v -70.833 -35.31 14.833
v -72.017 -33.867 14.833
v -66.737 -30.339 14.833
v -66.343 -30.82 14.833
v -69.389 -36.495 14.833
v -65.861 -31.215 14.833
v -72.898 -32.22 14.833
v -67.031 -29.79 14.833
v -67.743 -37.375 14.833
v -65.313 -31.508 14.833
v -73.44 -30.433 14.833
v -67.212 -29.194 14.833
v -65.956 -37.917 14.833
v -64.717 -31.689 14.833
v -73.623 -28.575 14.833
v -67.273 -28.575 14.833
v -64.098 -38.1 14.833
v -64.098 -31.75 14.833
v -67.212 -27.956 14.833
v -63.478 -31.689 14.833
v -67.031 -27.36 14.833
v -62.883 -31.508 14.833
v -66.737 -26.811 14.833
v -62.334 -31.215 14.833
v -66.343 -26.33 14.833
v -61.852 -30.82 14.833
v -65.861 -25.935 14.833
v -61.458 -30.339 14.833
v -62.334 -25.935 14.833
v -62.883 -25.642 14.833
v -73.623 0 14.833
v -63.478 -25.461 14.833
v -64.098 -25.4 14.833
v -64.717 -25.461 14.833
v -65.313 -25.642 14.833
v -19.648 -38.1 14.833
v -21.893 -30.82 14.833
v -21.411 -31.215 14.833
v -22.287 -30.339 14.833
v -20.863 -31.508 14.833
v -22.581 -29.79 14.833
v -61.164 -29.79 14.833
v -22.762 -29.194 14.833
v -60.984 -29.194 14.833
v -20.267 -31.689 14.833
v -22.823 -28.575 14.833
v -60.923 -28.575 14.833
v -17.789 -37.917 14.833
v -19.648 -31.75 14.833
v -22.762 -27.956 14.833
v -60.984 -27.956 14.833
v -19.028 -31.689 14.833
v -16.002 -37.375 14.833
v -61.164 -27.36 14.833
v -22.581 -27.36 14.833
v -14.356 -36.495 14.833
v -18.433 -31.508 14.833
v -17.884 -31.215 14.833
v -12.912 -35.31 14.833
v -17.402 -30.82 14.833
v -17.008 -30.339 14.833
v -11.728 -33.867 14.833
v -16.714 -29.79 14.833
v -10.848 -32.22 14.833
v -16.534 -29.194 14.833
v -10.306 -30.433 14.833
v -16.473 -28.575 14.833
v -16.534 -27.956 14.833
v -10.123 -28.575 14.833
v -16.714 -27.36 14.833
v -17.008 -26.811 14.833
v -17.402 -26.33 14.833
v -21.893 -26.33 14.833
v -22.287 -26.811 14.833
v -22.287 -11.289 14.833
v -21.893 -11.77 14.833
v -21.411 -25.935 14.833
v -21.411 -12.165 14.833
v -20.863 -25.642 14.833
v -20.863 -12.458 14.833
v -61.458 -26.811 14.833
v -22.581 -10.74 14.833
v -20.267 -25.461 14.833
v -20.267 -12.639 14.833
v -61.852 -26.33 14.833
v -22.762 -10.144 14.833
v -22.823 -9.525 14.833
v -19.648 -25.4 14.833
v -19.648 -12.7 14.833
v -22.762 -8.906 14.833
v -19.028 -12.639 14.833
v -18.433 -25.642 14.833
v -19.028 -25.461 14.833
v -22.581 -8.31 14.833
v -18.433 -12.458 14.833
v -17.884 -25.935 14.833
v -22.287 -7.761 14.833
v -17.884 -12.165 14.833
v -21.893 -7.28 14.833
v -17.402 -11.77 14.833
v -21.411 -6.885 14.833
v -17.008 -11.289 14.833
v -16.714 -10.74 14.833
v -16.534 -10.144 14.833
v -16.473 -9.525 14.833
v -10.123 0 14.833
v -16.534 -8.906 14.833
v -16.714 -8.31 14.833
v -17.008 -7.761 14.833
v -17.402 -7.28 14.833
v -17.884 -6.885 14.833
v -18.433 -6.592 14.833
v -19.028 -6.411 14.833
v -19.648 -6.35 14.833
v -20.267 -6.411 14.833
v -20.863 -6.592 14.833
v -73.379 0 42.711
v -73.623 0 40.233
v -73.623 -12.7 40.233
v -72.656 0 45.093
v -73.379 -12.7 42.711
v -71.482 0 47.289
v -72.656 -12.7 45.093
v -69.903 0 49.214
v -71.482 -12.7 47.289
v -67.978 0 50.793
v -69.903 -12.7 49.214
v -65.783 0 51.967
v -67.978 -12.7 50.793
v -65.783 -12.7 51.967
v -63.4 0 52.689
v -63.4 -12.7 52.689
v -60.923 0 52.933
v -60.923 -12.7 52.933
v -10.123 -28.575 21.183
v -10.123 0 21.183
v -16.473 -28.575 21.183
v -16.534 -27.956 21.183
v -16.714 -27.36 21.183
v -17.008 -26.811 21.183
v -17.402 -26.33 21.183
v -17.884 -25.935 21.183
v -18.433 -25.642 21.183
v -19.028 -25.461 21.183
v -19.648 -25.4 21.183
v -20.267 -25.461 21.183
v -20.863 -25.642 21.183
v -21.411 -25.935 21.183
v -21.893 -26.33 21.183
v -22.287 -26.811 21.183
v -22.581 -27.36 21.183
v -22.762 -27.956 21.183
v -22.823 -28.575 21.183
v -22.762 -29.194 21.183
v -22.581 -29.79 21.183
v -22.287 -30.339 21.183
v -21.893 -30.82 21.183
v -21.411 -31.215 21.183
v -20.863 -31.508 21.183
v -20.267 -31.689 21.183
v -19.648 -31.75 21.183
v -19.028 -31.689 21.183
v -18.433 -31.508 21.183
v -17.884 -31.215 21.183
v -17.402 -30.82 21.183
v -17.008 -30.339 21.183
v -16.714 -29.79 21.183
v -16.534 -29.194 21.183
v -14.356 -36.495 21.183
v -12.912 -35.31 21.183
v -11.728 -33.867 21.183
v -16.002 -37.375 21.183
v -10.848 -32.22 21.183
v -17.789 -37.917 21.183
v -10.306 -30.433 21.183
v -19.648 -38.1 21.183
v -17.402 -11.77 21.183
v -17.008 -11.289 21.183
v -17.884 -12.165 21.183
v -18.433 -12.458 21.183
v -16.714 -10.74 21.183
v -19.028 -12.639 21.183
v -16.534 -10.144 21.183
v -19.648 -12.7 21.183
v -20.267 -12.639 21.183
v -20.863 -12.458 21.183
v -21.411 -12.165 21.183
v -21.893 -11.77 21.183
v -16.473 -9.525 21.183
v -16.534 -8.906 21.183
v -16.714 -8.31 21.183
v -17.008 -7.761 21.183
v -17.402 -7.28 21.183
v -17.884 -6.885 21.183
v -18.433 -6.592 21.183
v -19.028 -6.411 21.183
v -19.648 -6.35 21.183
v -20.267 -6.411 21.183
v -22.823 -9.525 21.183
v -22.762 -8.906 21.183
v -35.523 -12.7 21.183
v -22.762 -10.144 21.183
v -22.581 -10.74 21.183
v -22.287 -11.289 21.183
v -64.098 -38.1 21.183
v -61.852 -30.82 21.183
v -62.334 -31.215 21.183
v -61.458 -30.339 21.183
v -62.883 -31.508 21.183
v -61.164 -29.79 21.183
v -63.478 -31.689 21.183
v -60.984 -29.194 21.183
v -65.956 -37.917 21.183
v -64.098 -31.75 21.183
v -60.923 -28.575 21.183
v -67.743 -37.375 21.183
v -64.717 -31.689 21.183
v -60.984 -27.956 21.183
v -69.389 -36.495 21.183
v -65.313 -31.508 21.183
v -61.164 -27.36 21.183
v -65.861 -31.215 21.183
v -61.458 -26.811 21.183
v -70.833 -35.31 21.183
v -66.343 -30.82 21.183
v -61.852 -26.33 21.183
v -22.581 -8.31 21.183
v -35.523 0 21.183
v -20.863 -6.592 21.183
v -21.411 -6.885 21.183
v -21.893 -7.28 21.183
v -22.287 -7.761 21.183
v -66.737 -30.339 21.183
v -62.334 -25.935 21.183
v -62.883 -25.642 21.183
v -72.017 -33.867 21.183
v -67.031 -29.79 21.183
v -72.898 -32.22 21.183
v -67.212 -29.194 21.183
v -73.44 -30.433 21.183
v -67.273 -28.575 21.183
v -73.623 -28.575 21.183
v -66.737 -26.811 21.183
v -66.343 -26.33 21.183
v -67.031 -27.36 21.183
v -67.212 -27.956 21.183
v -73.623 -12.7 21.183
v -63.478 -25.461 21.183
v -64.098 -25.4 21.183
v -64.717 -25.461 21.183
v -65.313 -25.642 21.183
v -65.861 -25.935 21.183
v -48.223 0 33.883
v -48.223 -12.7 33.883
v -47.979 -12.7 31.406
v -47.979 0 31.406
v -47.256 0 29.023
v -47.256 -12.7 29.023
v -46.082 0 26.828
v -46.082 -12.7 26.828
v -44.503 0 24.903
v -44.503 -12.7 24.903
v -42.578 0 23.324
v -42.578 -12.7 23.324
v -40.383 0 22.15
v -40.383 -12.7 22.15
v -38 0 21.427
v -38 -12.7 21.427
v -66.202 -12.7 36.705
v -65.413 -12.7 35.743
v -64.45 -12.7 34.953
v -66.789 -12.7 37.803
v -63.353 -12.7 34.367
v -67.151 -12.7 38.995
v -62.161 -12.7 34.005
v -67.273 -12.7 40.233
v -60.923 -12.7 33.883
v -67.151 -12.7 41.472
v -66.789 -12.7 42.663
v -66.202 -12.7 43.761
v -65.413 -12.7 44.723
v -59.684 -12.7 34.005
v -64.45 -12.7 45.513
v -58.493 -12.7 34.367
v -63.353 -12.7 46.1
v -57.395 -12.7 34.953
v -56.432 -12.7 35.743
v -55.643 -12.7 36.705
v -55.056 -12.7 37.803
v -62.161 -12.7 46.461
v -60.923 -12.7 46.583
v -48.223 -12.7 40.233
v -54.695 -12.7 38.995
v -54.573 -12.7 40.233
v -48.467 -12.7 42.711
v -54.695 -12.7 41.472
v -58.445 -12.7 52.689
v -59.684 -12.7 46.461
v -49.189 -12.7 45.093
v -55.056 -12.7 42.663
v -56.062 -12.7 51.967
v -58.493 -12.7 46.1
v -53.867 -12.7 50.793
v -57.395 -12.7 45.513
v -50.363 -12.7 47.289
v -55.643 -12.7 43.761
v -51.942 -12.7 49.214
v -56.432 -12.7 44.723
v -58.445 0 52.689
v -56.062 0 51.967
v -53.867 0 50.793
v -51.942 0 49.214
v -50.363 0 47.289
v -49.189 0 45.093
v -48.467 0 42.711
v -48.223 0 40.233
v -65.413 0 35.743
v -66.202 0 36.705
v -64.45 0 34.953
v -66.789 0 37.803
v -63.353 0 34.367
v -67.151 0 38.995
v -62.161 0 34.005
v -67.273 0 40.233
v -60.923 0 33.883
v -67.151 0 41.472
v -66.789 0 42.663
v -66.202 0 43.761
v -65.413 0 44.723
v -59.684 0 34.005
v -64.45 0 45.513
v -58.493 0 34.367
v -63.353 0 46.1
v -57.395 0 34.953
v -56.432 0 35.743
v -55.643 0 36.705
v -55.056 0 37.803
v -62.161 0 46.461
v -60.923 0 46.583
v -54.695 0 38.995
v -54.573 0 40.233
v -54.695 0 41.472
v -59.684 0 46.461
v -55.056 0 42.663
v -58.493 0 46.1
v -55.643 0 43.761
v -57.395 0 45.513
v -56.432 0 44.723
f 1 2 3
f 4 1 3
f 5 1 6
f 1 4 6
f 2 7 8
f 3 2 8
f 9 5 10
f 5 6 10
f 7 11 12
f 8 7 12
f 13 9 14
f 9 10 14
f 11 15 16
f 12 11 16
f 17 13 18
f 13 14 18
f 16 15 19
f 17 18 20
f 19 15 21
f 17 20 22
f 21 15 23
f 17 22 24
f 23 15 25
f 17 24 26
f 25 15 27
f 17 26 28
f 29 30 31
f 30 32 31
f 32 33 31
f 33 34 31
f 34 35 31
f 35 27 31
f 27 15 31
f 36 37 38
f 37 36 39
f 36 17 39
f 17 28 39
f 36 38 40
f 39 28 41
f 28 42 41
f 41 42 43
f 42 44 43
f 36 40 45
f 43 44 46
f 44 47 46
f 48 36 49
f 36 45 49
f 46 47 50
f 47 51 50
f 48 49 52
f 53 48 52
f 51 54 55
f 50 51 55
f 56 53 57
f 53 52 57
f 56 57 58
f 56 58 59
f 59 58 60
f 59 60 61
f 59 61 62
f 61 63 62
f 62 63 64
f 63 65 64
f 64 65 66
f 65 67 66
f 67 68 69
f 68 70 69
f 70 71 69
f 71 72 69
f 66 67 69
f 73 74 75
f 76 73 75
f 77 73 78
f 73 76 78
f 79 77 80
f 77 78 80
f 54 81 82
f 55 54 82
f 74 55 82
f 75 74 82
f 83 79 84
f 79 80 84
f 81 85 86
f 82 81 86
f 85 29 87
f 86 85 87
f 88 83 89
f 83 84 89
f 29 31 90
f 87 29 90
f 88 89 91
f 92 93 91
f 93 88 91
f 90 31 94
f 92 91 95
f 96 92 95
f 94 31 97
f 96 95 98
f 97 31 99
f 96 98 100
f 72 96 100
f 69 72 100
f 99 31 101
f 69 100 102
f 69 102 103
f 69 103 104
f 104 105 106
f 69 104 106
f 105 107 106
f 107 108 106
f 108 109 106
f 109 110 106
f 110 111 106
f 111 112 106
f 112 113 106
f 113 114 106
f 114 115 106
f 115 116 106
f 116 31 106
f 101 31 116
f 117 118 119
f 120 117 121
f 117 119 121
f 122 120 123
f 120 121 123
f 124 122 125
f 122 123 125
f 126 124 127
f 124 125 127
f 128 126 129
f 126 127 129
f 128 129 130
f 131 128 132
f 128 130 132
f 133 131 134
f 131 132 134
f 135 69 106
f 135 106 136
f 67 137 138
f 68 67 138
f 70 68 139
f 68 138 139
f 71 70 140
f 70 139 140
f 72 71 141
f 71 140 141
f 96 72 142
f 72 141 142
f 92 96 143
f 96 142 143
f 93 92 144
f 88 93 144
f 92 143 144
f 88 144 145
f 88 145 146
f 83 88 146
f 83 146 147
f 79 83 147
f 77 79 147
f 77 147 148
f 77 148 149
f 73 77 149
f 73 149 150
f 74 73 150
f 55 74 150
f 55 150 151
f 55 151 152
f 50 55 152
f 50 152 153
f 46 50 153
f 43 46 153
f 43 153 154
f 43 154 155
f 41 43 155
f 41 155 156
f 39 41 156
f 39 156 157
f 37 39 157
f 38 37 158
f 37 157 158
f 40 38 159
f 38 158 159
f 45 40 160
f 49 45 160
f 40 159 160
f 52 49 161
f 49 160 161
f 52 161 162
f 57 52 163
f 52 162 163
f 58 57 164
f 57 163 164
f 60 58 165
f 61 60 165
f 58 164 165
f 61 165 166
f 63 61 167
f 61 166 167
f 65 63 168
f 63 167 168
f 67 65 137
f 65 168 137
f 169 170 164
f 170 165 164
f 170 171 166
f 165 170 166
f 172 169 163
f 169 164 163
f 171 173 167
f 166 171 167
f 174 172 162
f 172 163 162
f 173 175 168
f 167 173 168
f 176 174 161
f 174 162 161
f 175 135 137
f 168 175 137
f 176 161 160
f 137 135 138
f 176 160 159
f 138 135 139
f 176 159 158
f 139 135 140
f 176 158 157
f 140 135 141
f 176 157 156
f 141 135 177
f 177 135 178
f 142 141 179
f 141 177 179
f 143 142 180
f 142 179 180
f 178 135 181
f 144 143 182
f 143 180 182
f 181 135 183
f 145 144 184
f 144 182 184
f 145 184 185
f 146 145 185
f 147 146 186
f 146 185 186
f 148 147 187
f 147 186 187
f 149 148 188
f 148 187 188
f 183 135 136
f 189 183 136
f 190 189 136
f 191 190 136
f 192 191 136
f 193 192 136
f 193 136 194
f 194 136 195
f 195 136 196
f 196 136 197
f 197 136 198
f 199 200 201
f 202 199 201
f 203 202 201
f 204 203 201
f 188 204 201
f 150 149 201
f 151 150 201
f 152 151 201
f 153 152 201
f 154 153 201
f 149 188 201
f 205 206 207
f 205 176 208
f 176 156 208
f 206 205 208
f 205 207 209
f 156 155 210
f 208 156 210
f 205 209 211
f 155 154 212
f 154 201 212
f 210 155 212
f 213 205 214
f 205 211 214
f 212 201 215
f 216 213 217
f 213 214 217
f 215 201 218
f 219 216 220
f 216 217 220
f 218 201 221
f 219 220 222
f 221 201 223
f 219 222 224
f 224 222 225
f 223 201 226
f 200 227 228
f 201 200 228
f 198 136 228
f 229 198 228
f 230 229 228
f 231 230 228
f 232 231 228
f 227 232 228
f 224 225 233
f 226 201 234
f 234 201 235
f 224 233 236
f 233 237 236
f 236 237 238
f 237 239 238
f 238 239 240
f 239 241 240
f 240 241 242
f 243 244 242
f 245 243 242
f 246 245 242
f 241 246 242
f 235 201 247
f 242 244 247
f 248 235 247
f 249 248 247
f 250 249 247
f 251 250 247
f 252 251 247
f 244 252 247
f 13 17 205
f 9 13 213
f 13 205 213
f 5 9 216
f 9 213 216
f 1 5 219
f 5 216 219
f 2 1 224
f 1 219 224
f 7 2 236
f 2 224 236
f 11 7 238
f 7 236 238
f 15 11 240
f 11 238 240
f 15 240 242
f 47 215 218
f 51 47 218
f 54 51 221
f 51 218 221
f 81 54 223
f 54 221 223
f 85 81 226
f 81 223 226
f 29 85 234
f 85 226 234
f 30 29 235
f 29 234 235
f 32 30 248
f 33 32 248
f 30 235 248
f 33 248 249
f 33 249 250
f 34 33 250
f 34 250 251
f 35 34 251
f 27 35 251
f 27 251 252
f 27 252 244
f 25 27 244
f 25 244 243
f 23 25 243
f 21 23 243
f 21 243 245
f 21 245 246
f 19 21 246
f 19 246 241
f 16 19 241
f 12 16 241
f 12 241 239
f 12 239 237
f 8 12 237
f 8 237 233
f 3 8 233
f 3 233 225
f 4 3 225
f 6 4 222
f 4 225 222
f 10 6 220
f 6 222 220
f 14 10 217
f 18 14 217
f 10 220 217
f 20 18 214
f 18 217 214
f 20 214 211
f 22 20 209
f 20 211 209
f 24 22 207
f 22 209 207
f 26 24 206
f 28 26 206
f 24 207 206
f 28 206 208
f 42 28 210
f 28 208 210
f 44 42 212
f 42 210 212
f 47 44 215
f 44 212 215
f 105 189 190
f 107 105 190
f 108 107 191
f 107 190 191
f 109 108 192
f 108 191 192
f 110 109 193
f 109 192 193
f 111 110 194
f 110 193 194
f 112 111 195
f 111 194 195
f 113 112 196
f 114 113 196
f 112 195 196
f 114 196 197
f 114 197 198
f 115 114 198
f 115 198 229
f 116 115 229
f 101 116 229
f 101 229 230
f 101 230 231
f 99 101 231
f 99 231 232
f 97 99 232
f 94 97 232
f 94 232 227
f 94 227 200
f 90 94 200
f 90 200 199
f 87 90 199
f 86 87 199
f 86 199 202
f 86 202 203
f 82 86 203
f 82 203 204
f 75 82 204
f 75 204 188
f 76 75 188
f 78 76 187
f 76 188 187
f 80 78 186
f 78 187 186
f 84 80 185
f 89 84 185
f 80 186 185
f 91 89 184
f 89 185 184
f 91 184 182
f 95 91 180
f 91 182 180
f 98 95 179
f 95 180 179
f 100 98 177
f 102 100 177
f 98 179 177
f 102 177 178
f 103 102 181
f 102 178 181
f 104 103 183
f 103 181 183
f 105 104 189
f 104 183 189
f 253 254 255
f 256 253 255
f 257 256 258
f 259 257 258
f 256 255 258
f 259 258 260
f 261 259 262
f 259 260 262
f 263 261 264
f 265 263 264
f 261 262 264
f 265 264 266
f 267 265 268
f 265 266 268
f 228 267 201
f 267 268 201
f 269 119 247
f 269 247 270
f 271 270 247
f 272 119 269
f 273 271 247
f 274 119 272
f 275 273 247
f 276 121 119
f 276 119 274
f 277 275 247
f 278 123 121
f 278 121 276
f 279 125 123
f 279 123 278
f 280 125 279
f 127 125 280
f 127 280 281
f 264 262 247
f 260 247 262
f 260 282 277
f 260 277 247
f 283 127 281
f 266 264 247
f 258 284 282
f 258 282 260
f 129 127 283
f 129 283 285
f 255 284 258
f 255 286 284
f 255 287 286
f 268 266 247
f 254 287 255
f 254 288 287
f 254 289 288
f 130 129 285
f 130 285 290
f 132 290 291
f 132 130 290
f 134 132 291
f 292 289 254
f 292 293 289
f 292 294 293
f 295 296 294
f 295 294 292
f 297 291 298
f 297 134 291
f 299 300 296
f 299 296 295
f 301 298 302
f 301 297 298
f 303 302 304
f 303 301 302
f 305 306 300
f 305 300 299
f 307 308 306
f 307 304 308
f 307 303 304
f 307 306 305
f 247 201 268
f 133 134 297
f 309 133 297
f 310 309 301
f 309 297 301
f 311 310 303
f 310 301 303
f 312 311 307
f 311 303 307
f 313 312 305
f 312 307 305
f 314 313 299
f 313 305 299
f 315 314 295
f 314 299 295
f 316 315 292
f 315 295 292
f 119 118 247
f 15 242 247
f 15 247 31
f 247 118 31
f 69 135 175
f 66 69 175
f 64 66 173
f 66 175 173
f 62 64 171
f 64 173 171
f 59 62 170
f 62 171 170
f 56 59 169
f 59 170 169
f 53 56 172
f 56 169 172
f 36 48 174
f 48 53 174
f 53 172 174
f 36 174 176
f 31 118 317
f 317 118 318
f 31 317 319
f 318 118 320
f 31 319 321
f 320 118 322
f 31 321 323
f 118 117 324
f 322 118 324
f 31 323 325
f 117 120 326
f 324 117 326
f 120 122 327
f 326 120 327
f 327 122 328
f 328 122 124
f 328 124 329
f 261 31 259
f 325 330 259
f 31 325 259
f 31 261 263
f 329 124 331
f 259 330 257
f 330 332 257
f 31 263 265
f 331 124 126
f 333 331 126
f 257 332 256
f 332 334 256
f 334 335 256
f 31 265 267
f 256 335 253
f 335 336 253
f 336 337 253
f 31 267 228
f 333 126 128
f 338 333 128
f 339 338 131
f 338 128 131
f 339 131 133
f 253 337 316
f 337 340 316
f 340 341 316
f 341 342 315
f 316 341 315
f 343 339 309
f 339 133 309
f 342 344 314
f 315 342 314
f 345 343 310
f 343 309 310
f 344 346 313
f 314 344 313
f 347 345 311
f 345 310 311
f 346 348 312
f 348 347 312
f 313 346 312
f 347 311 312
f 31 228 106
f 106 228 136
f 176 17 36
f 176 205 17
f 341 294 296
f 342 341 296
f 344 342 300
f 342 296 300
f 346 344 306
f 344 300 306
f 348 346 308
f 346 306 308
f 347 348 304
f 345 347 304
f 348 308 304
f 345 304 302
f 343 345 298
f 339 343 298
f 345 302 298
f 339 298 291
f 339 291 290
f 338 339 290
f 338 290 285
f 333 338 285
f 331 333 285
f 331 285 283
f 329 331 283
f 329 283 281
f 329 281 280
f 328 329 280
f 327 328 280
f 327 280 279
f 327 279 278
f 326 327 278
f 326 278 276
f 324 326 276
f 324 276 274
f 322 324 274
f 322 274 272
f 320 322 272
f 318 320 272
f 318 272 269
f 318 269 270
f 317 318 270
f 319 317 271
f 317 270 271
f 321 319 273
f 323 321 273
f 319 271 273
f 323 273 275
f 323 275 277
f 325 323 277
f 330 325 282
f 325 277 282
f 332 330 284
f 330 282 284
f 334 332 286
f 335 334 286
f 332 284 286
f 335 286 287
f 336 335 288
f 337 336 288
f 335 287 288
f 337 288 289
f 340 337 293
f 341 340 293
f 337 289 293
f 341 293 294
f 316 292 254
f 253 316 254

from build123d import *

# Parameters (mm, degrees)
F1_DEPTH  = 38.1
F2_W      = 38.1
F2_H      = 31.75
F3_DEPTH  = 25.4
F4_R      = 3.175
F5_DEPTH  = 25.4
F6_R      = 3.175
F7_DEPTH  = 25.4
F8_R      = 6.35
F9_DEPTH  = 25.4
F11_DEPTH = 25.4


with BuildPart() as f1:
    # F0 (on Front) → F1 (new body)
    with BuildSketch(Plane.XZ):
        Polygon((-35.522558, 52.933332), (-73.622558, 52.933332), (-73.622558, 14.833332), (-10.122558, 14.833332), (-10.122558, 21.183332), (-35.522558, 21.183332), align=None)
    extrude(amount=F1_DEPTH)

    # F2 (on face) → F3 (cut)
    with BuildSketch(Plane.XZ.offset(38.1)):
        with Locations((-54.572558, 37.058332)):
            Rectangle(F2_W, F2_H)
    extrude(amount=-F3_DEPTH, mode=Mode.SUBTRACT)

    # F4 (on face) → F5 (cut)
    with BuildSketch(Plane.XY.offset(21.183332)):
        with Locations((-19.647558, -28.575)):
            Circle(F4_R)
        with Locations((-64.097558, -28.575)):
            Circle(F4_R)
        with BuildLine():
            Line((-73.622558, -38.1), (-64.097558, -38.1))
            ThreePointArc((-64.097558, -38.1), (-70.83275, -35.310192), (-73.622558, -28.575))
            Line((-73.622558, -28.575), (-73.622558, -38.1))
        make_face()
        with BuildLine():
            ThreePointArc((-10.122558, -28.575), (-12.912366, -35.310192), (-19.647558, -38.1))
            Line((-19.647558, -38.1), (-10.122558, -38.1))
            Line((-10.122558, -38.1), (-10.122558, -28.575))
        make_face()
    extrude(amount=-F5_DEPTH, mode=Mode.SUBTRACT)

    # F6 (on face) → F7 (cut)
    with BuildSketch(Plane.XY.offset(21.183332)):
        with Locations((-19.647558, -9.525)):
            Circle(F6_R)
    extrude(amount=-F7_DEPTH, mode=Mode.SUBTRACT)

    # F8 (on face) → F9 (cut)
    with BuildSketch(Plane.XZ.offset(12.7)):
        with Locations((-60.922558, 40.233332)):
            Circle(F8_R)
    extrude(amount=-F9_DEPTH, mode=Mode.SUBTRACT)

    # F10 (on face) → F11 (cut)
    with BuildSketch(Plane.XZ.offset(12.7)):
        with BuildLine():
            ThreePointArc((-60.922558, 52.933332), (-51.942302, 49.213588), (-48.222558, 40.233332))
            Line((-48.222558, 40.233332), (-48.222558, 33.883332))
            ThreePointArc((-48.222558, 33.883332), (-44.502814, 24.903076), (-35.522558, 21.183332))
            Line((-35.522558, 21.183332), (-35.522558, 52.933332))
            Line((-35.522558, 52.933332), (-60.922558, 52.933332))
        make_face()
        with BuildLine():
            ThreePointArc((-73.622558, 40.233332), (-69.902814, 49.213588), (-60.922558, 52.933332))
            Line((-60.922558, 52.933332), (-73.622558, 52.933332))
            Line((-73.622558, 52.933332), (-73.622558, 40.233332))
        make_face()
    extrude(amount=-F11_DEPTH, mode=Mode.SUBTRACT)


solid = f1.part
